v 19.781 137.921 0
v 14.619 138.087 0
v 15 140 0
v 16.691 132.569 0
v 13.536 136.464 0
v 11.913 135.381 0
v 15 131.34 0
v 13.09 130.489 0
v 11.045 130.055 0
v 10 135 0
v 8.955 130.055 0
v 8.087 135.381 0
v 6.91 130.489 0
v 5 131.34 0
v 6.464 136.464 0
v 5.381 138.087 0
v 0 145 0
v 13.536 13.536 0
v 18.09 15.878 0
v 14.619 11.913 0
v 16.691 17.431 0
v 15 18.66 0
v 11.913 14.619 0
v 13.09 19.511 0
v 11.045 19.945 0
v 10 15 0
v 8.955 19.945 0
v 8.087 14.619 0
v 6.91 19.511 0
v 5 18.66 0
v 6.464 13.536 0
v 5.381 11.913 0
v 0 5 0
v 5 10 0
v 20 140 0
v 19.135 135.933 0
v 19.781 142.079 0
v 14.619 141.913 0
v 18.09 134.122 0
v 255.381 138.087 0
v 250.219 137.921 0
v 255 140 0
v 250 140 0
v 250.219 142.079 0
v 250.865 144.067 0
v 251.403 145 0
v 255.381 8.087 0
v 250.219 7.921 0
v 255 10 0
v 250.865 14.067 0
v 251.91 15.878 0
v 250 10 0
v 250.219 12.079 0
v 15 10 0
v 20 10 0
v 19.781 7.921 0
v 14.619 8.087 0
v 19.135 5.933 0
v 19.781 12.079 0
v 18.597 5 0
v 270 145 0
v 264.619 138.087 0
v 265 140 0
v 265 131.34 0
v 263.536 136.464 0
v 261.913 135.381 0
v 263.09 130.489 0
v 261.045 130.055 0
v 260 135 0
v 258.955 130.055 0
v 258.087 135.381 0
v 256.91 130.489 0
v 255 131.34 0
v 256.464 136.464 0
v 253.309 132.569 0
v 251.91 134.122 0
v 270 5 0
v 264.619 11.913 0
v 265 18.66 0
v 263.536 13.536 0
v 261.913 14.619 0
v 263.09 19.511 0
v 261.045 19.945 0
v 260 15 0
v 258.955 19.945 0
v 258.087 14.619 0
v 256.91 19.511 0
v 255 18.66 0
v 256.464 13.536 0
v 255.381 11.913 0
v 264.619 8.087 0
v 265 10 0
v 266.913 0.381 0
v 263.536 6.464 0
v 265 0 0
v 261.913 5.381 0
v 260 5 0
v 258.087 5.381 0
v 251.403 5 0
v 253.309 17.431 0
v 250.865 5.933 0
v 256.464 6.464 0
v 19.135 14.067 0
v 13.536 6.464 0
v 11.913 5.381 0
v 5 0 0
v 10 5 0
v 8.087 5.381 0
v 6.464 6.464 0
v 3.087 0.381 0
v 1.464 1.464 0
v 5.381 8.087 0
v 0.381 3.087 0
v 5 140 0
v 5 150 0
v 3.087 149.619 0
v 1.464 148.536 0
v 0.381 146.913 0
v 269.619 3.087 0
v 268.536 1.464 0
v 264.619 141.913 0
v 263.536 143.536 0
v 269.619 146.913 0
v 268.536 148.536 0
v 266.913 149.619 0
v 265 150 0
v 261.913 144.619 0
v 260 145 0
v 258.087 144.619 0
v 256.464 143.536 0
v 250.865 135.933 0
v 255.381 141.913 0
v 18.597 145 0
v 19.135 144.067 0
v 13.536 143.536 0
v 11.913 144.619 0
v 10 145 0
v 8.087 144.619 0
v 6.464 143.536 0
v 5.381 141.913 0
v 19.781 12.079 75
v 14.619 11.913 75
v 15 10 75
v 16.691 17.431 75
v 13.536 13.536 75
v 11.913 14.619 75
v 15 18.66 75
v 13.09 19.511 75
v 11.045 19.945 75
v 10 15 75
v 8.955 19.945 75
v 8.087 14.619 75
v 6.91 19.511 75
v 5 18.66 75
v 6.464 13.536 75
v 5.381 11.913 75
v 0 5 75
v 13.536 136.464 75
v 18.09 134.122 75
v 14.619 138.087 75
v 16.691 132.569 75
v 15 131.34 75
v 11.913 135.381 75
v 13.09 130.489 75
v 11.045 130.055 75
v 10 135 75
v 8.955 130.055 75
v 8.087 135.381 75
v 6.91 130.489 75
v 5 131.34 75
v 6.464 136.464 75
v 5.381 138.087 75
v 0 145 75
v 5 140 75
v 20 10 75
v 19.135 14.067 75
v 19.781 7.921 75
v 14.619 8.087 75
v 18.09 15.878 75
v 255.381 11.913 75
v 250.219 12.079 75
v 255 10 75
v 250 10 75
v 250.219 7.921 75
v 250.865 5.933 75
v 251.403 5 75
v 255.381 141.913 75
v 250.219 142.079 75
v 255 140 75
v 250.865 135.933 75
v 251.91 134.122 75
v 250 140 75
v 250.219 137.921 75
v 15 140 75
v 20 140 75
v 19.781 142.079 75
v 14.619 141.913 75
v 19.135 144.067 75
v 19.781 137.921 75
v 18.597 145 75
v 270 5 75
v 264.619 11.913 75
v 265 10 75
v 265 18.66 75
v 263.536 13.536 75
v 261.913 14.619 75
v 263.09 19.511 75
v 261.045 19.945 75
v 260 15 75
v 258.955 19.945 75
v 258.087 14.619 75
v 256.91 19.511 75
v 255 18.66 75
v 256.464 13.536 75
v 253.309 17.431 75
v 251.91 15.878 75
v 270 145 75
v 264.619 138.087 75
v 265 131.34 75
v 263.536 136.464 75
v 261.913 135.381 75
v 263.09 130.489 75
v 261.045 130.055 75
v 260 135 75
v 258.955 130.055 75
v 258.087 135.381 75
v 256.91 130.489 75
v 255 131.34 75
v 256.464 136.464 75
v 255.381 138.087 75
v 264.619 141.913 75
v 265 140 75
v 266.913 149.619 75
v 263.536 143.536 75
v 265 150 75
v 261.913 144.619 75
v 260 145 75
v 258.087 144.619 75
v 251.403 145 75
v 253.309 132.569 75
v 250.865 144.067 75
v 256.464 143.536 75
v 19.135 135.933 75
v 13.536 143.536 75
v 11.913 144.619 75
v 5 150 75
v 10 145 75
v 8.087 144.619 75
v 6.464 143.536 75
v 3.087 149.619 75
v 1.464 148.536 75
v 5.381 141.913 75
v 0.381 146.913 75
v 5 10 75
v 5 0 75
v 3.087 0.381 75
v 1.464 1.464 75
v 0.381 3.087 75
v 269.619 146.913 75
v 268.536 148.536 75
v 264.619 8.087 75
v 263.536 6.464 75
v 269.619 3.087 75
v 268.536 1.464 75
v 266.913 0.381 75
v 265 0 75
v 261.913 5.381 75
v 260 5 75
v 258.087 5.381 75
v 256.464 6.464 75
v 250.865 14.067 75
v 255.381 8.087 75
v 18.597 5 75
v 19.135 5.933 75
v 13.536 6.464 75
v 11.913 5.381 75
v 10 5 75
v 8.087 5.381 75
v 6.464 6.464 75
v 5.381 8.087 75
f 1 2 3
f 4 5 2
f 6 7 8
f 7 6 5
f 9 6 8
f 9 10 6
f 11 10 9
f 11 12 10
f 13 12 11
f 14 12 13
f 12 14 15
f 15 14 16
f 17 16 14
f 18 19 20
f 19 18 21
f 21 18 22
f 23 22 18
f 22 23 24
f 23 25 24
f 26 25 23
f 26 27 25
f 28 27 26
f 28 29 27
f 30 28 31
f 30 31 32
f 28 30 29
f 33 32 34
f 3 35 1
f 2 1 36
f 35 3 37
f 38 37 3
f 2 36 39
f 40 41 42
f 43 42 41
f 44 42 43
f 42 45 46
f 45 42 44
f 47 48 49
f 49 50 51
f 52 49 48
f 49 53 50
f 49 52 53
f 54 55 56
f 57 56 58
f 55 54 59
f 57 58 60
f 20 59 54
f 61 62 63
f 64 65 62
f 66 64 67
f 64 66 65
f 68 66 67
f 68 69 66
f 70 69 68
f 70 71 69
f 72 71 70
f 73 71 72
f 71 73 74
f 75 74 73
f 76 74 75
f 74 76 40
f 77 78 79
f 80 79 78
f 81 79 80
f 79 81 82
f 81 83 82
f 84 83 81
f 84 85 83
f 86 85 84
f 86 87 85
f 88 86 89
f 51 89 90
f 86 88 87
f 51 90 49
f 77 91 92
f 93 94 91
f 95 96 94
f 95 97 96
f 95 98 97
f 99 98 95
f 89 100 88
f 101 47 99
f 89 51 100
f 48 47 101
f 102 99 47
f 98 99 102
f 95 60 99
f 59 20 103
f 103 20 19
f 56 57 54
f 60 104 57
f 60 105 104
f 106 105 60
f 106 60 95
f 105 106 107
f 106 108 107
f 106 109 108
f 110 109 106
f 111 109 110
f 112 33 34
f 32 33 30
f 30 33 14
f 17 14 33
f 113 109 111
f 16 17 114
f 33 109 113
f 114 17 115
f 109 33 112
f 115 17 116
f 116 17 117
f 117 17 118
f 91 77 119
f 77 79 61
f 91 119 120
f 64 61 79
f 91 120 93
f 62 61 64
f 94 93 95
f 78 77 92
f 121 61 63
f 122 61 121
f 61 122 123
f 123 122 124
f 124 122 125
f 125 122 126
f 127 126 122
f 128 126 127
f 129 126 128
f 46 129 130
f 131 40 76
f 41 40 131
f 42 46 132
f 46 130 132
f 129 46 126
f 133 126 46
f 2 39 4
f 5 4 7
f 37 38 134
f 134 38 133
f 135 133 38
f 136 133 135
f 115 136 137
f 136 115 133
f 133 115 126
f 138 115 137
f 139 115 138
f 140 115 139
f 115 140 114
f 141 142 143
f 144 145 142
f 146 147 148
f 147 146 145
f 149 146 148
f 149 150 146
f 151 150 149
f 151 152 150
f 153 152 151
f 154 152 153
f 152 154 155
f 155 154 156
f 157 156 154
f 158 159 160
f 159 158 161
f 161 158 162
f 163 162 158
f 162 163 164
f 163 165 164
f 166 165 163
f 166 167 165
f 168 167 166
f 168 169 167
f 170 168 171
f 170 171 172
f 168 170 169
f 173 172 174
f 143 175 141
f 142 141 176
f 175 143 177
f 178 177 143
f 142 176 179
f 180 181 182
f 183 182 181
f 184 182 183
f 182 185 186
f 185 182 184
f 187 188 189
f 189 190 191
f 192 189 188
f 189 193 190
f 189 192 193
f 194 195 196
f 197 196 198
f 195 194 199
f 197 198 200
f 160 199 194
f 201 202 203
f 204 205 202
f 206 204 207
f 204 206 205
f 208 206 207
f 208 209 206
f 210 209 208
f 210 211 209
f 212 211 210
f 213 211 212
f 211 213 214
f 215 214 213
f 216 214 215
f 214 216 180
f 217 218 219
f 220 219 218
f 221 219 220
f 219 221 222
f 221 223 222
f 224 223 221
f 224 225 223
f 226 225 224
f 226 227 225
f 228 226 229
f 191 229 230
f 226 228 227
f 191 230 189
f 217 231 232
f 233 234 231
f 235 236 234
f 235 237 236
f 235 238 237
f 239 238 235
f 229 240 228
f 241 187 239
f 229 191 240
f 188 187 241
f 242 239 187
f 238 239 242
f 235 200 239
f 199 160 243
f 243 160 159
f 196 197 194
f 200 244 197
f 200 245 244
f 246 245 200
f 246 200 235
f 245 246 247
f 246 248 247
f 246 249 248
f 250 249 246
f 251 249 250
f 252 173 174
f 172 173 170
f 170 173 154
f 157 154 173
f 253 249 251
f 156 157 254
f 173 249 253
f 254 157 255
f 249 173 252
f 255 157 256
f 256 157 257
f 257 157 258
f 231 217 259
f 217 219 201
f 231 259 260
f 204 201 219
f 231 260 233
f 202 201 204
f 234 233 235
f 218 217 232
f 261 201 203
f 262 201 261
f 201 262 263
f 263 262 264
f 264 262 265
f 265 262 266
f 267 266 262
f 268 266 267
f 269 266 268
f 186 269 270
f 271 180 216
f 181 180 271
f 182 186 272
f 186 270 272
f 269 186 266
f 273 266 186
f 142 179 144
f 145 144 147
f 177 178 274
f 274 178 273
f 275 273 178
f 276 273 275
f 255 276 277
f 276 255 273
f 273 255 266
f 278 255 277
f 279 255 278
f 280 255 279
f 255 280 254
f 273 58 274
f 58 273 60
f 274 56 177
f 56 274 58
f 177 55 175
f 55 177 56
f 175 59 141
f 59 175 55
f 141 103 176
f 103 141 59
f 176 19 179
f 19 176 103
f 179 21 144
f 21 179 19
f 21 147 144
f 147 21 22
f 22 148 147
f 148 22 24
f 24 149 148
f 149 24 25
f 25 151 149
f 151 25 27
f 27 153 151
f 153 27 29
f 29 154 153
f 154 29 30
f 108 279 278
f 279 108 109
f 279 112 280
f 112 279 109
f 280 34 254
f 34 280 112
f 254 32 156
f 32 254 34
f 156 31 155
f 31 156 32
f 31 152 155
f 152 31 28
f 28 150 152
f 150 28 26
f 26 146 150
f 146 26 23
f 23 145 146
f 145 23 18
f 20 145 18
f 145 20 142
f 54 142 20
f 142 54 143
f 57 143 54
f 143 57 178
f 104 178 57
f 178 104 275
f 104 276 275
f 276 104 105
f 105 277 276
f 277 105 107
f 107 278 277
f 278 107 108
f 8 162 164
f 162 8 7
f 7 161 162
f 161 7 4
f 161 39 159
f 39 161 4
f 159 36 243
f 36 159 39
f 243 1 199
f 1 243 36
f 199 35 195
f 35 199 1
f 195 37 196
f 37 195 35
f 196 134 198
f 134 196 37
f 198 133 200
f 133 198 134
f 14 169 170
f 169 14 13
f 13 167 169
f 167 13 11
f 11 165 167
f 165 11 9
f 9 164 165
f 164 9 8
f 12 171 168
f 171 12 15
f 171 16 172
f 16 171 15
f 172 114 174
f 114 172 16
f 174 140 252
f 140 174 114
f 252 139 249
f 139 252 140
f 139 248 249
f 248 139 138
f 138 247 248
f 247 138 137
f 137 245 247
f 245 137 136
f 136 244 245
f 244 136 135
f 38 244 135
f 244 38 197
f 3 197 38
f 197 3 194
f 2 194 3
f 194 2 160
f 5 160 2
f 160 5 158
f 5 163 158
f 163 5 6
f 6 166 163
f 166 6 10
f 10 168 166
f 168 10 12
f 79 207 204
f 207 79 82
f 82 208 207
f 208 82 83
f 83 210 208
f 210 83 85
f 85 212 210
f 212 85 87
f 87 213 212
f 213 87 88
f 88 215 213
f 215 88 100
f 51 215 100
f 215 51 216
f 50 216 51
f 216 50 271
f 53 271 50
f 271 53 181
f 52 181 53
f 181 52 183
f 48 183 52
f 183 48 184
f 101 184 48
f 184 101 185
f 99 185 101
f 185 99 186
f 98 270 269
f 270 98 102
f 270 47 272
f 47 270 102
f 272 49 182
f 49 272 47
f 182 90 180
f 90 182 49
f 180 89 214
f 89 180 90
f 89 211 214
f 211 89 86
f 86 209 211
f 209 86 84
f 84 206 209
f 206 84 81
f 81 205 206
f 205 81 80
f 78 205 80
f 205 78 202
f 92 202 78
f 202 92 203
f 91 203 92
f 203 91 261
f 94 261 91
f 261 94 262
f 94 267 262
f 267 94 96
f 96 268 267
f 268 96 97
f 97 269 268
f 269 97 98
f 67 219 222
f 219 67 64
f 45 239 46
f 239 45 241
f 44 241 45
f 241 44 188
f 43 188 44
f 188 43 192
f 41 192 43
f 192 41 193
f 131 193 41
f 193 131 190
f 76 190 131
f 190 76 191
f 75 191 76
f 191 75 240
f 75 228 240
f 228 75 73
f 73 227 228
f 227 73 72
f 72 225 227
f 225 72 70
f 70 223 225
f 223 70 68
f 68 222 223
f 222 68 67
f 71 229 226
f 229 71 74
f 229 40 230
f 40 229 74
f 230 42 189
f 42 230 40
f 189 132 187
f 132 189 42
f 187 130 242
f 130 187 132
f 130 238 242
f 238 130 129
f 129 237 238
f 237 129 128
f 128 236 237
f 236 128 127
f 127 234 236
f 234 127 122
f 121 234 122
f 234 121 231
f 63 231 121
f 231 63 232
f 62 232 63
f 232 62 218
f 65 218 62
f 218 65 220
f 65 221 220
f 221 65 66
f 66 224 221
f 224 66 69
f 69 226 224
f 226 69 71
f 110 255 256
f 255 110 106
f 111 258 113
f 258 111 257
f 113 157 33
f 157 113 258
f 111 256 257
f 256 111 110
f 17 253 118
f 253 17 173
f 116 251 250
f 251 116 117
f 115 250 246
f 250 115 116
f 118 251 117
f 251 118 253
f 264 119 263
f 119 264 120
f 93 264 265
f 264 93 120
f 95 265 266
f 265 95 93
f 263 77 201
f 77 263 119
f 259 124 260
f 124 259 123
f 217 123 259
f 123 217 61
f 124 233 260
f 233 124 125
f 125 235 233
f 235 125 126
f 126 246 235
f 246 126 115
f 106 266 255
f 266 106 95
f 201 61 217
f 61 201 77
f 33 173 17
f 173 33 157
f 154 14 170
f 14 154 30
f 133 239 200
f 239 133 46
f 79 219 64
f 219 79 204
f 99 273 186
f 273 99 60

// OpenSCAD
use <MCAD/boxes.scad>

// Choose Part
part = "1"; // [1:Case Only,2:Cover Plate Only,3:Both]

// Width of the case
width = 270;

// Depth of the case
depth = 150;

// Height of the case
height = 75;

// Material thickness of the case and plates
material_thickness = 5;

// Corner radius of rounded corners
corner_radius = 5;

// Hole offset
hole_offset = 10; //[1:14]

// Hole diameter
hole_diameter = 10;

print_part();

module print_part() {
	if (part == "1") {
		base();
	} else if (part == "2") {
		plate();
	} else if (part == "3") {
		both();
	} else {
		both();
	}
}

module both(){
	base();
	translate([0,0,height])
		plate();
}

module base(){
	// All dimensions in mm
	x = width;
	y = depth;
	z = height;

	union(){
		for (i=[ [hole_offset,hole_offset, 0],
				[hole_offset,y-hole_offset, 0],
				[x-hole_offset,hole_offset, 0],
				[x-hole_offset,y-hole_offset, 0] ])
			{
			translate(i){
				linear_extrude(height=z){
					difference(){
						circle(r=(hole_diameter));
						circle(r=(hole_diameter/2));
					}
				}
			}
		}
		difference(){
			translate([x/2, y/2, height/2]){
			  roundedBox([x, y, height], 5, true);
			}
			translate([material_thickness, material_thickness, 0]) {
				linear_extrude(height=z)
				square(size = [x-(material_thickness*2), y-(material_thickness*2)], center = false);
		   	}
		}
	}
}


module plate(){
	// All dimensions in mm
	x = width;
	y = depth;
	z = material_thickness;

	difference() {
		// create the base
		translate([x/2, y/2, z/2]){
		  roundedBox([x, y, z], corner_radius, true);
		}
		// Create 4 holes
		for (i = [ [hole_offset,hole_offset, -10],
			[hole_offset,y-hole_offset, -10],
			[x-hole_offset,hole_offset, -10],
			[x-hole_offset,y-hole_offset, -10] ])
		{
			translate(i) {
				linear_extrude(height = z + 10)
				circle(r=(hole_diameter/2));
			}
		}
	}
}
